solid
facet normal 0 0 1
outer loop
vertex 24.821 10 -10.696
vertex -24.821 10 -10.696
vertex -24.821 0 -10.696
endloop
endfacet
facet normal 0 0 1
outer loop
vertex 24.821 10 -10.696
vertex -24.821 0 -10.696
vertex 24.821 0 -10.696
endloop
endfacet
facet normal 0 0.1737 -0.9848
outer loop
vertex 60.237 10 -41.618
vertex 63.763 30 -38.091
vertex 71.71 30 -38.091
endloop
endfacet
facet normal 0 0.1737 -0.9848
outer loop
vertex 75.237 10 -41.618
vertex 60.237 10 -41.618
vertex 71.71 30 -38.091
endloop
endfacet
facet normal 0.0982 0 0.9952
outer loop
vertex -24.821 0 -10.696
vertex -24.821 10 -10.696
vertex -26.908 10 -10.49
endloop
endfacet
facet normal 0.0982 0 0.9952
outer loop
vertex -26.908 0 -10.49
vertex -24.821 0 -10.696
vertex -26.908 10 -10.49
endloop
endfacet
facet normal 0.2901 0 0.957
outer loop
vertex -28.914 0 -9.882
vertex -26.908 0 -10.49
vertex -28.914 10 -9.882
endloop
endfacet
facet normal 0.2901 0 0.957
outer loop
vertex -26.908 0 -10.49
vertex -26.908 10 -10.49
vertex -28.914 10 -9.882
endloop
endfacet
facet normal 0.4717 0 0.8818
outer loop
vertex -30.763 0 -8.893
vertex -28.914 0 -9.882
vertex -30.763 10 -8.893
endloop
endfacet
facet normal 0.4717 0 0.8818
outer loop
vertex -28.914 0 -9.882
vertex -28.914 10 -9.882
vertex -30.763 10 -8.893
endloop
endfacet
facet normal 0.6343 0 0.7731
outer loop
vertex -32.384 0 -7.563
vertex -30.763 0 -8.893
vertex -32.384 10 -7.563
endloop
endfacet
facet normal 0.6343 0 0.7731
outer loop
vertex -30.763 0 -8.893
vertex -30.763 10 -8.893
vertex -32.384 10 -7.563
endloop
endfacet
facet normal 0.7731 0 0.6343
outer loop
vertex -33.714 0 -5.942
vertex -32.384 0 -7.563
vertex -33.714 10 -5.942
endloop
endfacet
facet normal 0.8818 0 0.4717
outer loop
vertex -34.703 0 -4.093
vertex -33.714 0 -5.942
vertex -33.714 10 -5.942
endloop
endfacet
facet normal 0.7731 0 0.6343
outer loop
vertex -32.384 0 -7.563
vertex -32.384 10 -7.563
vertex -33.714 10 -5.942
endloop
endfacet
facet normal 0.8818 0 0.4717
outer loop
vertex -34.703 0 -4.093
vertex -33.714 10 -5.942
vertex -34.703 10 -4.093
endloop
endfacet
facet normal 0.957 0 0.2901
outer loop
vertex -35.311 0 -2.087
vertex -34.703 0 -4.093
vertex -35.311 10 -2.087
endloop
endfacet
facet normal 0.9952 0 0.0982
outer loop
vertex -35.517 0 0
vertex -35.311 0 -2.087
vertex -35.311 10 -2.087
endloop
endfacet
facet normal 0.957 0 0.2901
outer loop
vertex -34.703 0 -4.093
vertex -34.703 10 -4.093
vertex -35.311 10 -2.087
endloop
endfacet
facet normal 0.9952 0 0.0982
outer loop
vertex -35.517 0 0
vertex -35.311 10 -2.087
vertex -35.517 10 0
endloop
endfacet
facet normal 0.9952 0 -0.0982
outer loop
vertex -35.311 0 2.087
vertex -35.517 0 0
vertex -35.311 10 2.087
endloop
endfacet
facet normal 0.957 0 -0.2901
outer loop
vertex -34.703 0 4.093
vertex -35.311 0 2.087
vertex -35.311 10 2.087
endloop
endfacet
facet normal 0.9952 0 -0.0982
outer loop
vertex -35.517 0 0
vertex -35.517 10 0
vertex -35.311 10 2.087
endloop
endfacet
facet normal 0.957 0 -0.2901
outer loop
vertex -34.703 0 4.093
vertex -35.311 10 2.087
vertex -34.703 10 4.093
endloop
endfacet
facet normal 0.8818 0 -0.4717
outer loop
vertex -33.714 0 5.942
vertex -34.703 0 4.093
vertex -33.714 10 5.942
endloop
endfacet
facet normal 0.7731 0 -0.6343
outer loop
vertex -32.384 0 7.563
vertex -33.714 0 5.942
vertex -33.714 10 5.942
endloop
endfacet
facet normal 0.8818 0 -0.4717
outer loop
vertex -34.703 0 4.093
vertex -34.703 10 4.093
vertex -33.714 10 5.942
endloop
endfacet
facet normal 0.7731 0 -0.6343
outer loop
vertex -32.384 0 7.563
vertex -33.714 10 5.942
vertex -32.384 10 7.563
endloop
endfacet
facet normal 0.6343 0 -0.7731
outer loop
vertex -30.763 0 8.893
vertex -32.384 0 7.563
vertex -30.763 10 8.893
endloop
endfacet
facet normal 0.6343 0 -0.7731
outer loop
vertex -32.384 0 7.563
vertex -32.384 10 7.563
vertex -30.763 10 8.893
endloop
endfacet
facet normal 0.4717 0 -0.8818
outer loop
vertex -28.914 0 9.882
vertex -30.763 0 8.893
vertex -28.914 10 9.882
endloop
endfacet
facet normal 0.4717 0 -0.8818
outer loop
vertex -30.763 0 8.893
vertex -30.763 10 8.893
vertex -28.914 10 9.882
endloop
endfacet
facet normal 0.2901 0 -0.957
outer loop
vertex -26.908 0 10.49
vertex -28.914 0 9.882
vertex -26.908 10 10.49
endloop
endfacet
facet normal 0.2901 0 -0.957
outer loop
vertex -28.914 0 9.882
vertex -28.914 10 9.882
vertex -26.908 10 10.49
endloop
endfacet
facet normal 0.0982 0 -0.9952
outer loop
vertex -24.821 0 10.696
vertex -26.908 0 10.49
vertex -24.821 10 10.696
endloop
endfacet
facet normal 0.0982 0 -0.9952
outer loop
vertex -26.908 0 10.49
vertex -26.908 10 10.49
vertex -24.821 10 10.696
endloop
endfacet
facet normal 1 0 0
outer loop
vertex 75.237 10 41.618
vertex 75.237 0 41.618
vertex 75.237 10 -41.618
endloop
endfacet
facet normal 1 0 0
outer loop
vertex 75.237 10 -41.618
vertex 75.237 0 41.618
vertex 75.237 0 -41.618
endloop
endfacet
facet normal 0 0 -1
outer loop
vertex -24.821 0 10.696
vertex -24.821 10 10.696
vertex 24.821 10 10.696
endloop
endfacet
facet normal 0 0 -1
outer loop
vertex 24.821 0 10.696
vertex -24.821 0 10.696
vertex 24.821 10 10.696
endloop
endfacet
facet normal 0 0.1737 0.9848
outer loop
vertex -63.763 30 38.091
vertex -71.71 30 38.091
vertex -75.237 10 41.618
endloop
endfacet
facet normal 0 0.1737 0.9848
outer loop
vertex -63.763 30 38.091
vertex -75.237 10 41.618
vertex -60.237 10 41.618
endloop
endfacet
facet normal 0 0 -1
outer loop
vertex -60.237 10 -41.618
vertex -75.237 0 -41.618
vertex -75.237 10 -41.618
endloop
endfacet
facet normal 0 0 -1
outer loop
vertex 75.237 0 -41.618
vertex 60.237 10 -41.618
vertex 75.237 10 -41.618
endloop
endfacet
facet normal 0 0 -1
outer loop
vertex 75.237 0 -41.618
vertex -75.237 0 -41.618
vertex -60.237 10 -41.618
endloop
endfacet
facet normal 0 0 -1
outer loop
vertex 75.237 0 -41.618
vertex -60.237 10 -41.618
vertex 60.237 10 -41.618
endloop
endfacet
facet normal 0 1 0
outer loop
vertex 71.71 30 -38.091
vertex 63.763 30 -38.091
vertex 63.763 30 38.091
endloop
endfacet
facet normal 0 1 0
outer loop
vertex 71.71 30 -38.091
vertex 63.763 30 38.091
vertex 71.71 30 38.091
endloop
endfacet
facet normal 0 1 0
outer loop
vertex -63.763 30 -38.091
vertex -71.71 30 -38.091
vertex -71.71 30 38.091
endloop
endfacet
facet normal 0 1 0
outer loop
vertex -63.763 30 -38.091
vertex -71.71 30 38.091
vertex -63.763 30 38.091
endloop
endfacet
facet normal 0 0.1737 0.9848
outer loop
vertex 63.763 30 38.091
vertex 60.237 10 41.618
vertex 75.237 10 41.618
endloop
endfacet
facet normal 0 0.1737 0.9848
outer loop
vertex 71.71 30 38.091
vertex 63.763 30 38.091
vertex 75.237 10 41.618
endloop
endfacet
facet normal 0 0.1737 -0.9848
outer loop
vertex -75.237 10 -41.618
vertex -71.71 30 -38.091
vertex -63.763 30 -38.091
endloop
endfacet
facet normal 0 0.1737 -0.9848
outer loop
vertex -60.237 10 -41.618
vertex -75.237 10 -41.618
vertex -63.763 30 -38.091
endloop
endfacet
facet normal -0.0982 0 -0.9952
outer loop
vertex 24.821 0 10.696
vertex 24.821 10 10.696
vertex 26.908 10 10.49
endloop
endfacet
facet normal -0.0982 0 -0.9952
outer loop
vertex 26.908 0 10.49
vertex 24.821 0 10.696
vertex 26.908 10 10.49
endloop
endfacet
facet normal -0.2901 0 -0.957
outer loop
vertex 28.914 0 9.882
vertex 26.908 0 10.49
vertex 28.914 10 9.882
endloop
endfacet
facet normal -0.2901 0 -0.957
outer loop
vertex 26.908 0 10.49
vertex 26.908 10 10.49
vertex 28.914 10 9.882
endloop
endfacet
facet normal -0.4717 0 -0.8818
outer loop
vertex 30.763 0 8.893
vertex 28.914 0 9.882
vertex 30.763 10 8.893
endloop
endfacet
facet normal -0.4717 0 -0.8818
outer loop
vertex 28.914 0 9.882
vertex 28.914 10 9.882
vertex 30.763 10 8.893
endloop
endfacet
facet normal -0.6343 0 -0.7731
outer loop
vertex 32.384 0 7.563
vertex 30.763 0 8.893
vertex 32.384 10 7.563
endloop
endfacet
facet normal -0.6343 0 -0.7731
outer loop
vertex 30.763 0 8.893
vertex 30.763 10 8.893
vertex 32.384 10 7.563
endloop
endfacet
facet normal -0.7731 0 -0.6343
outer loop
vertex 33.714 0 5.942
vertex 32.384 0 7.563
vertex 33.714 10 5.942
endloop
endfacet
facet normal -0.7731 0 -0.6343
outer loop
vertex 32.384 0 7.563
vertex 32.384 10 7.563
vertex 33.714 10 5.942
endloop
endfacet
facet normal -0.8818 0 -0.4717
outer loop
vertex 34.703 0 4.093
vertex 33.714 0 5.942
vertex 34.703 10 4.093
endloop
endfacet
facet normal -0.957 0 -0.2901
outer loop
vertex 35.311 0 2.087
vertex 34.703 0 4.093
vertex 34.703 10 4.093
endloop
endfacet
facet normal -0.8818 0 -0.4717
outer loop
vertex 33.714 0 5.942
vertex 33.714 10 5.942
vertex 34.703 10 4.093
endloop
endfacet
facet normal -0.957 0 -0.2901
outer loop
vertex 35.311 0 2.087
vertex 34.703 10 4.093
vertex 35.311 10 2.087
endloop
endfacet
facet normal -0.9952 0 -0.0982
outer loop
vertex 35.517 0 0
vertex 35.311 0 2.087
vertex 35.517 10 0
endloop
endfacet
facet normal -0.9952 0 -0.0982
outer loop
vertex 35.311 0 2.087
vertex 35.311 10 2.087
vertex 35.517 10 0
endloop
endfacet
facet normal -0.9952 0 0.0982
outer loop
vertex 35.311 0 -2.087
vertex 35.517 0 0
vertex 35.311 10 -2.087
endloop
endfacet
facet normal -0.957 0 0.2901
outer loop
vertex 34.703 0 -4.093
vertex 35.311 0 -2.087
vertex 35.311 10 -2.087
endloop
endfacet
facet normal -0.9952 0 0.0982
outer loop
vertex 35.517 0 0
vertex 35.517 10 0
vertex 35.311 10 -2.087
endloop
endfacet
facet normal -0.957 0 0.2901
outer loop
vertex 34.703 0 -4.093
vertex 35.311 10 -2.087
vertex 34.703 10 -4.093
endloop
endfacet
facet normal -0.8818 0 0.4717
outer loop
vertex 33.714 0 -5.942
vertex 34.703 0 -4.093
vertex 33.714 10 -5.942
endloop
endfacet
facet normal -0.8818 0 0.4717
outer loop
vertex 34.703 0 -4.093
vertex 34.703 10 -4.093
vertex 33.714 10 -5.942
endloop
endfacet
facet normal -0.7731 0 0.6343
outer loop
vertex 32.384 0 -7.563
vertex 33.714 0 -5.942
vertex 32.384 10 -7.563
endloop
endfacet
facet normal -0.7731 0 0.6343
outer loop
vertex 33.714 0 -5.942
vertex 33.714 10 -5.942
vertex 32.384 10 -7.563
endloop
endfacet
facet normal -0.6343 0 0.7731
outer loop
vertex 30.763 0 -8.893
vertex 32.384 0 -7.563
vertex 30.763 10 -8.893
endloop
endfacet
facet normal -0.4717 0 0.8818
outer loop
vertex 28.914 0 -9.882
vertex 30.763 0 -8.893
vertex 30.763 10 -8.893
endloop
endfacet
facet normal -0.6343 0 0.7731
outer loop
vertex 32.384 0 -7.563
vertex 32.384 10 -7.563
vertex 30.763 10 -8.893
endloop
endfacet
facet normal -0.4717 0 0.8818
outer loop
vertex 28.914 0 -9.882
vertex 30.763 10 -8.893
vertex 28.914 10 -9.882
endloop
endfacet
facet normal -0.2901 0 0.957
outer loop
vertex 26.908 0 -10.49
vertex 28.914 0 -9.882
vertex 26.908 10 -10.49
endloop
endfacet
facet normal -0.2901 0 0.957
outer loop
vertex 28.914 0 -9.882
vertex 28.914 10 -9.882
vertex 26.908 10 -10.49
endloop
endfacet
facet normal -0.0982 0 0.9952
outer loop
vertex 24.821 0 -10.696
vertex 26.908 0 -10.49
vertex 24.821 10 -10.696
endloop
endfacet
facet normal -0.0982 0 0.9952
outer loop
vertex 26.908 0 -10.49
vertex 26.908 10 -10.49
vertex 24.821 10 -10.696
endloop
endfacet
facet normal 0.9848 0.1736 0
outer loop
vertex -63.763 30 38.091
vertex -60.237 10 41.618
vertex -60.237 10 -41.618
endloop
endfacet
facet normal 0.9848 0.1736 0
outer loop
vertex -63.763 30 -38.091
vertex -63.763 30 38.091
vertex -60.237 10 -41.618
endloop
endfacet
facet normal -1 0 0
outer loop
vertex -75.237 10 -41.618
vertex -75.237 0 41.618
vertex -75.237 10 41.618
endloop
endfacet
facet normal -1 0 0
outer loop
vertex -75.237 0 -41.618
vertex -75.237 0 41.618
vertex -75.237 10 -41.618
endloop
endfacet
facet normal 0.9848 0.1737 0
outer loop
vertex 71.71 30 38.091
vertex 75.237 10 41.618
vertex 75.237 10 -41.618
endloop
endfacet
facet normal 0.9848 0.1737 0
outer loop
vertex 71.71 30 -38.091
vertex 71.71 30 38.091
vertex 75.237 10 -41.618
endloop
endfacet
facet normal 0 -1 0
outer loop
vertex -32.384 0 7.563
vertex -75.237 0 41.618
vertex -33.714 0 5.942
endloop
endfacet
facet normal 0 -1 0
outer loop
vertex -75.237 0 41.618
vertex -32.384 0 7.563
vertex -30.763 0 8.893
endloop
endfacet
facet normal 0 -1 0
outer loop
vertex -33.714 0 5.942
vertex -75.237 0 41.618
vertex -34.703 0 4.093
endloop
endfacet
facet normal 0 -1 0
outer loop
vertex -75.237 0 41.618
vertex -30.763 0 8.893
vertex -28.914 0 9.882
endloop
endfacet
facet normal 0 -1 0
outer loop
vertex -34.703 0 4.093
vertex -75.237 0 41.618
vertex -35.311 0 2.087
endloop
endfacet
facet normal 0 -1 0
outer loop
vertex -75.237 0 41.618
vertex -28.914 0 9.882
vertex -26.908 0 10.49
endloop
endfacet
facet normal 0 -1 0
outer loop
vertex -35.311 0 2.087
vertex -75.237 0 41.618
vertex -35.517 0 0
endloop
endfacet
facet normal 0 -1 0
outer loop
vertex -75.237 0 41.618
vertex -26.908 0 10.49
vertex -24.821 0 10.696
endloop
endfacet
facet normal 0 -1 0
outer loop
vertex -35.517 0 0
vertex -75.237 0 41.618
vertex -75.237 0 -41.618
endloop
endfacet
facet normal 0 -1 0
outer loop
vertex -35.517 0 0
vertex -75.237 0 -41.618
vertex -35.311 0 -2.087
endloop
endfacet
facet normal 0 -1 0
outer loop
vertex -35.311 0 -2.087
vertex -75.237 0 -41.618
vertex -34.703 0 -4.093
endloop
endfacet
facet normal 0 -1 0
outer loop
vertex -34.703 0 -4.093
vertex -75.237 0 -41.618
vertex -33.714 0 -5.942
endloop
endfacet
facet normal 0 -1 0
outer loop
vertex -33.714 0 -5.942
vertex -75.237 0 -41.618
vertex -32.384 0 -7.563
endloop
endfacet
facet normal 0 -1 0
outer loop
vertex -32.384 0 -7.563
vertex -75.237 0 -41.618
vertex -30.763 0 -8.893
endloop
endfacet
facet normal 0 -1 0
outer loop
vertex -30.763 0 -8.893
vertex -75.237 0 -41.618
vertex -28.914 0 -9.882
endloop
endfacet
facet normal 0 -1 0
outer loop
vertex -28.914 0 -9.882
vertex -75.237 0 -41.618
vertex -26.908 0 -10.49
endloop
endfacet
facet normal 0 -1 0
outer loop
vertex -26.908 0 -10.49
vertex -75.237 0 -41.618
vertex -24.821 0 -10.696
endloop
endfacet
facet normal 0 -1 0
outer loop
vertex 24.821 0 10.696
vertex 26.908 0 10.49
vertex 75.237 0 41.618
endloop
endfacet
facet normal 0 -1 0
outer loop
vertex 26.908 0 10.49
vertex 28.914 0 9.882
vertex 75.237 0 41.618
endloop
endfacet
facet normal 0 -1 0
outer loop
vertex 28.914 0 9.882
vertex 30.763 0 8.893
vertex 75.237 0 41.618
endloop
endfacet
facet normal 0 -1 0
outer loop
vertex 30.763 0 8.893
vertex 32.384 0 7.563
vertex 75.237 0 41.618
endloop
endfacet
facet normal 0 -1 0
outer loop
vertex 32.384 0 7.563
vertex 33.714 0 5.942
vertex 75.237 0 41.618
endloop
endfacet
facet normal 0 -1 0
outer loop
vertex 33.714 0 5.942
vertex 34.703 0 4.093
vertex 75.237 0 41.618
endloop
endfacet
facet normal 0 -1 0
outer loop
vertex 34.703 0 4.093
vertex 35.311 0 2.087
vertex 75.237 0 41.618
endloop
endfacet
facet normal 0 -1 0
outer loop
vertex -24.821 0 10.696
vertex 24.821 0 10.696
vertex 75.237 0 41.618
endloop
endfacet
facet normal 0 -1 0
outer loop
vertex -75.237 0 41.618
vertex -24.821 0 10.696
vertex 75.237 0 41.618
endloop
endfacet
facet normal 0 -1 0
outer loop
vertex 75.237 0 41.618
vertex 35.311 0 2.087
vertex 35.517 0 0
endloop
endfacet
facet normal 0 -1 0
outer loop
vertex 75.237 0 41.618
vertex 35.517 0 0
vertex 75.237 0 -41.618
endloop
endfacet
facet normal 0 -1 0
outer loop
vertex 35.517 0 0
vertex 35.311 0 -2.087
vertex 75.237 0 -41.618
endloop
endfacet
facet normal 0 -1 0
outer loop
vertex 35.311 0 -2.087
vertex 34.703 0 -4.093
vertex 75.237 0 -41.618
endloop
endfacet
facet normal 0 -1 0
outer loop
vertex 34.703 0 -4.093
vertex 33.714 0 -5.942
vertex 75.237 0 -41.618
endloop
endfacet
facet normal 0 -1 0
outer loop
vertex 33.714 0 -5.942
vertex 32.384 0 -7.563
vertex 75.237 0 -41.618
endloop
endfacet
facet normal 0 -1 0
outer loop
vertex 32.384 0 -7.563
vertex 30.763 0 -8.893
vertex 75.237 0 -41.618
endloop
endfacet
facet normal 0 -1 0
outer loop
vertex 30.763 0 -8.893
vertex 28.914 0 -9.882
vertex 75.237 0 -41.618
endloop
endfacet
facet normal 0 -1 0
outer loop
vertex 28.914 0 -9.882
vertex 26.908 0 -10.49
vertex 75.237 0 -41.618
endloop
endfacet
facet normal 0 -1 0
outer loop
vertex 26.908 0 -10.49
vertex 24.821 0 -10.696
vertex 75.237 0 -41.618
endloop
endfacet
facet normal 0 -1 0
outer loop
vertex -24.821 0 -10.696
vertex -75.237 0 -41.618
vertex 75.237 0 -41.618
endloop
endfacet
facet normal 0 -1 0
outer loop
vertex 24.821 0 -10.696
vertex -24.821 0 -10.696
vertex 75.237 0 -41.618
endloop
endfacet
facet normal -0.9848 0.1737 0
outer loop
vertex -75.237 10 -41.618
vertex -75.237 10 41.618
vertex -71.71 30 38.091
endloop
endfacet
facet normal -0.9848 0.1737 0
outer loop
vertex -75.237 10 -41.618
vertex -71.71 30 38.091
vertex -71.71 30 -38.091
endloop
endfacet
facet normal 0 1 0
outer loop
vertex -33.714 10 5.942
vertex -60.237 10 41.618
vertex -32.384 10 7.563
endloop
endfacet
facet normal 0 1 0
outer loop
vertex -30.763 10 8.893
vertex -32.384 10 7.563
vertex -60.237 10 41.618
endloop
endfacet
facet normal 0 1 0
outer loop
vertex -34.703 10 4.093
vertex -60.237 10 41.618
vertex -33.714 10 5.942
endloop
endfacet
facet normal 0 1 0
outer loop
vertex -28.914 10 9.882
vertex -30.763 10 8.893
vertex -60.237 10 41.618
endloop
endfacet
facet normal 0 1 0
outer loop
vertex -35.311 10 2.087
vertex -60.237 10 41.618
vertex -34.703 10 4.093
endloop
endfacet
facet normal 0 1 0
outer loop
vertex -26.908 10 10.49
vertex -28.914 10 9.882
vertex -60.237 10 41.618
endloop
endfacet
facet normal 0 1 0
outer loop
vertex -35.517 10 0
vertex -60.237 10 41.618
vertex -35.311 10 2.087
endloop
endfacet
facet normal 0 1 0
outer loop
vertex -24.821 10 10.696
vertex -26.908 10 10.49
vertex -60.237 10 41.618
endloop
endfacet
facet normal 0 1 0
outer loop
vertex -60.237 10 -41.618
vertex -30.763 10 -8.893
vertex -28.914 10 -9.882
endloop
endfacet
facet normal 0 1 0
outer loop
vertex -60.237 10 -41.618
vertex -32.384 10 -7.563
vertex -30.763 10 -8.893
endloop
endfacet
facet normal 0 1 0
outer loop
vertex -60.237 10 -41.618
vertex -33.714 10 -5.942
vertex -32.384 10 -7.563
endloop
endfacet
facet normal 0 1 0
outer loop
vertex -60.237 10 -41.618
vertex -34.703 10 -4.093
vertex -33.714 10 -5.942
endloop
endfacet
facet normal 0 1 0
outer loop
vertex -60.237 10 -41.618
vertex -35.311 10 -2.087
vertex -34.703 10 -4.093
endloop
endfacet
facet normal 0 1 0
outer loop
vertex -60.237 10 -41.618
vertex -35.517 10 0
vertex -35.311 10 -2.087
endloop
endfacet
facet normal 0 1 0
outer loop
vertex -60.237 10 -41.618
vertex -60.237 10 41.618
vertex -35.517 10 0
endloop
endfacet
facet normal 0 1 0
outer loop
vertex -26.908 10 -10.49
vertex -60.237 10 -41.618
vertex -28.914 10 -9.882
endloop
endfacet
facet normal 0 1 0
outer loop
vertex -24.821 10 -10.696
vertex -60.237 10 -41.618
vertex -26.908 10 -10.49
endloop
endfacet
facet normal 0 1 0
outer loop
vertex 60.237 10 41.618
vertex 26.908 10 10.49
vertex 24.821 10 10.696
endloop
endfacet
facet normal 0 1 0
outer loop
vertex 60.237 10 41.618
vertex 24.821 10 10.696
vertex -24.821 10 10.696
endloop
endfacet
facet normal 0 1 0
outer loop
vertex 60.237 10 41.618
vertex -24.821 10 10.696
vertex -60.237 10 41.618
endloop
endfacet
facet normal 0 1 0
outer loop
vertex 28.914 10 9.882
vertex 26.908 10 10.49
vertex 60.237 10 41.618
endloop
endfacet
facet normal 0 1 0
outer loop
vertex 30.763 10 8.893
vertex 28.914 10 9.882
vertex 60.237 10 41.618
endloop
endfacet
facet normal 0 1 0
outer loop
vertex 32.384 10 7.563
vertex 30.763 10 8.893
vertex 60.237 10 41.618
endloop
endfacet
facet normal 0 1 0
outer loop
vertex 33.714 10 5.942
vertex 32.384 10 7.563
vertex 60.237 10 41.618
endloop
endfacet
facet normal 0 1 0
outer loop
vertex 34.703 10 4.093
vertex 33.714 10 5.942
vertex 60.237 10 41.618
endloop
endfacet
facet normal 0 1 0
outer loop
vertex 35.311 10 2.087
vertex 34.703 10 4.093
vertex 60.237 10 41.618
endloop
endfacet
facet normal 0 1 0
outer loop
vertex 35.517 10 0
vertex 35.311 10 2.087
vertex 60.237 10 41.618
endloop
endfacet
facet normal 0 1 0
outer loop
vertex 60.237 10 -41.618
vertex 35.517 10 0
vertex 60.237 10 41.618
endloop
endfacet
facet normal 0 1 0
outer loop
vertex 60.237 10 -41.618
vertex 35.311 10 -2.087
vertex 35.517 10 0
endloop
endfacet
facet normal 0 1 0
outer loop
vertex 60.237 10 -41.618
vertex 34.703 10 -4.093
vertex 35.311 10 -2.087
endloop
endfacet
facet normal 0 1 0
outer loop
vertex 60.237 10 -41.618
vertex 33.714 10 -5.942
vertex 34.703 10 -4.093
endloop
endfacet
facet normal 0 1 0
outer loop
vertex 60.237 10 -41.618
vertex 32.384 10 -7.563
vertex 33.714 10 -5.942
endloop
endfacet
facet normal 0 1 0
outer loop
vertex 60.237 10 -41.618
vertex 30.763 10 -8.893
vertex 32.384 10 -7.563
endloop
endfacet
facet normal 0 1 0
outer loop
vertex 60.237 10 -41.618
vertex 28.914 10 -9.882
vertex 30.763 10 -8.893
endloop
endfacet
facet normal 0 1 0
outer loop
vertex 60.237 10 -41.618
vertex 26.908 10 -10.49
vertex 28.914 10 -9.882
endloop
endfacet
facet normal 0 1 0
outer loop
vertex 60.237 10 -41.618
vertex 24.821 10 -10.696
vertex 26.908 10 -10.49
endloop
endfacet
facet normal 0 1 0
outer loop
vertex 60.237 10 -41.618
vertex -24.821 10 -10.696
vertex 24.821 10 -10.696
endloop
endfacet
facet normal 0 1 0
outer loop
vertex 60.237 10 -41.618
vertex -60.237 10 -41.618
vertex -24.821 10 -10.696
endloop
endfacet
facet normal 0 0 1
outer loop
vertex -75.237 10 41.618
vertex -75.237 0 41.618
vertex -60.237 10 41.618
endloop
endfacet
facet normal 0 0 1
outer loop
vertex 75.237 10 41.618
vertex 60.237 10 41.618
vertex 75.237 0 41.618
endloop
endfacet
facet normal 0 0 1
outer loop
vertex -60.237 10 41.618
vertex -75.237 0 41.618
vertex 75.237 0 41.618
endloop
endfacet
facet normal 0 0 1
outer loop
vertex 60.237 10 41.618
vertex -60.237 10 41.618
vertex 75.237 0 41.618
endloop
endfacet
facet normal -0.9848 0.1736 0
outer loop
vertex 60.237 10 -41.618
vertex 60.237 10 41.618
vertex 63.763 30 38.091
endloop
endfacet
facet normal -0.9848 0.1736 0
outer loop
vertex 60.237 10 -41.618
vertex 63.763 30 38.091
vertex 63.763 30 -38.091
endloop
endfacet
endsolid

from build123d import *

# Parameters (mm, degrees)
SKETCH11_W                    = 150.473018286
SKETCH11_H                    = 83.2350749
BOSS_EXTRUDE1_DEPTH           = 10
SKETCH13_W                    = 15
SKETCH13_H                    = 83.2350749
BOSS_EXTRUDE2_DEPTH           = 20
BOSS_EXTRUDE2_DRAFT           = 10
BOSS_EXTRUDE2_PROFILE_2_DEPTH = 20
BOSS_EXTRUDE2_PROFILE_2_DRAFT = 10
SKETCH16_R                    = 10.695894528
SKETCH16_W                    = 49.642014298
SKETCH16_H                    = 21.391789056
CUT_EXTRUDE17_DEPTH           = 10


with BuildPart() as part:
    # Sketch11 → Boss-Extrude1 (new body)
    with BuildSketch(Plane(origin=(0, 0, 0), x_dir=(1, 0, 0), z_dir=(0, 1, 0))):
        Rectangle(SKETCH11_W, SKETCH11_H)
    extrude(amount=BOSS_EXTRUDE1_DEPTH)


with BuildPart() as boss_extrude2_tool:
    # Sketch13 → Boss-Extrude2 (with draft: the straight prism first)
    with BuildSketch(Plane(origin=(0, 10, 0), x_dir=(1, 0, 0), z_dir=(0, 1, 0))):
        with Locations((-67.736509143, 0)):
            Rectangle(SKETCH13_W, SKETCH13_H)
    extrude(amount=BOSS_EXTRUDE2_DEPTH)
    # Boss-Extrude2: the draft: its side faces are tilted about the plane it starts from
    boss_extrude2_sides = [boss_extrude2_tool.faces().sort_by_distance(p)[0] for p in [
        (-75.236509143, 20, 0),
        (-67.736509143, 20, 41.61753745),
        (-60.236509143, 20, 0),
        (-67.736509143, 20, -41.61753745),
    ]]
    draft(boss_extrude2_sides, Plane(origin=(0, 10, 0), x_dir=(1, 0, 0), z_dir=(0, 1, 0)), BOSS_EXTRUDE2_DRAFT)


with BuildPart() as part_1:
    add(part.part)

    # Boss-Extrude2: add boss_extrude2_tool
    add(boss_extrude2_tool.part)


with BuildPart() as boss_extrude2_profile_2_tool:
    # Sketch13 → Boss-Extrude2 profile 2 (with draft: the straight prism first)
    with BuildSketch(Plane(origin=(0, 10, 0), x_dir=(1, 0, 0), z_dir=(0, 1, 0))):
        with Locations((67.736509143, 0)):
            Rectangle(SKETCH13_W, SKETCH13_H)
    extrude(amount=BOSS_EXTRUDE2_PROFILE_2_DEPTH)
    # Boss-Extrude2 profile 2: the draft: its side faces are tilted about the plane it starts from
    boss_extrude2_profile_2_sides = [boss_extrude2_profile_2_tool.faces().sort_by_distance(p)[0] for p in [
        (67.736509143, 20, -41.61753745),
        (60.236509143, 20, 0),
        (67.736509143, 20, 41.61753745),
        (75.236509143, 20, 0),
    ]]
    draft(boss_extrude2_profile_2_sides, Plane(origin=(0, 10, 0), x_dir=(1, 0, 0), z_dir=(0, 1, 0)), BOSS_EXTRUDE2_PROFILE_2_DRAFT)


with BuildPart() as part_2:
    add(part_1.part)

    # Boss-Extrude2 profile 2: add boss_extrude2_profile_2_tool
    add(boss_extrude2_profile_2_tool.part)

    # Sketch16 → Cut-Extrude17 (cut)
    with BuildSketch(Plane(origin=(0, 10, 0), x_dir=(1, 0, 0), z_dir=(0, 1, 0))):
        with Locations((24.821007149, 0)):
            Circle(SKETCH16_R)
        with Locations((-24.821007149, 0)):
            Circle(SKETCH16_R)
        Rectangle(SKETCH16_W, SKETCH16_H)
    extrude(amount=-CUT_EXTRUDE17_DEPTH, mode=Mode.SUBTRACT)


solid = part_2.part
